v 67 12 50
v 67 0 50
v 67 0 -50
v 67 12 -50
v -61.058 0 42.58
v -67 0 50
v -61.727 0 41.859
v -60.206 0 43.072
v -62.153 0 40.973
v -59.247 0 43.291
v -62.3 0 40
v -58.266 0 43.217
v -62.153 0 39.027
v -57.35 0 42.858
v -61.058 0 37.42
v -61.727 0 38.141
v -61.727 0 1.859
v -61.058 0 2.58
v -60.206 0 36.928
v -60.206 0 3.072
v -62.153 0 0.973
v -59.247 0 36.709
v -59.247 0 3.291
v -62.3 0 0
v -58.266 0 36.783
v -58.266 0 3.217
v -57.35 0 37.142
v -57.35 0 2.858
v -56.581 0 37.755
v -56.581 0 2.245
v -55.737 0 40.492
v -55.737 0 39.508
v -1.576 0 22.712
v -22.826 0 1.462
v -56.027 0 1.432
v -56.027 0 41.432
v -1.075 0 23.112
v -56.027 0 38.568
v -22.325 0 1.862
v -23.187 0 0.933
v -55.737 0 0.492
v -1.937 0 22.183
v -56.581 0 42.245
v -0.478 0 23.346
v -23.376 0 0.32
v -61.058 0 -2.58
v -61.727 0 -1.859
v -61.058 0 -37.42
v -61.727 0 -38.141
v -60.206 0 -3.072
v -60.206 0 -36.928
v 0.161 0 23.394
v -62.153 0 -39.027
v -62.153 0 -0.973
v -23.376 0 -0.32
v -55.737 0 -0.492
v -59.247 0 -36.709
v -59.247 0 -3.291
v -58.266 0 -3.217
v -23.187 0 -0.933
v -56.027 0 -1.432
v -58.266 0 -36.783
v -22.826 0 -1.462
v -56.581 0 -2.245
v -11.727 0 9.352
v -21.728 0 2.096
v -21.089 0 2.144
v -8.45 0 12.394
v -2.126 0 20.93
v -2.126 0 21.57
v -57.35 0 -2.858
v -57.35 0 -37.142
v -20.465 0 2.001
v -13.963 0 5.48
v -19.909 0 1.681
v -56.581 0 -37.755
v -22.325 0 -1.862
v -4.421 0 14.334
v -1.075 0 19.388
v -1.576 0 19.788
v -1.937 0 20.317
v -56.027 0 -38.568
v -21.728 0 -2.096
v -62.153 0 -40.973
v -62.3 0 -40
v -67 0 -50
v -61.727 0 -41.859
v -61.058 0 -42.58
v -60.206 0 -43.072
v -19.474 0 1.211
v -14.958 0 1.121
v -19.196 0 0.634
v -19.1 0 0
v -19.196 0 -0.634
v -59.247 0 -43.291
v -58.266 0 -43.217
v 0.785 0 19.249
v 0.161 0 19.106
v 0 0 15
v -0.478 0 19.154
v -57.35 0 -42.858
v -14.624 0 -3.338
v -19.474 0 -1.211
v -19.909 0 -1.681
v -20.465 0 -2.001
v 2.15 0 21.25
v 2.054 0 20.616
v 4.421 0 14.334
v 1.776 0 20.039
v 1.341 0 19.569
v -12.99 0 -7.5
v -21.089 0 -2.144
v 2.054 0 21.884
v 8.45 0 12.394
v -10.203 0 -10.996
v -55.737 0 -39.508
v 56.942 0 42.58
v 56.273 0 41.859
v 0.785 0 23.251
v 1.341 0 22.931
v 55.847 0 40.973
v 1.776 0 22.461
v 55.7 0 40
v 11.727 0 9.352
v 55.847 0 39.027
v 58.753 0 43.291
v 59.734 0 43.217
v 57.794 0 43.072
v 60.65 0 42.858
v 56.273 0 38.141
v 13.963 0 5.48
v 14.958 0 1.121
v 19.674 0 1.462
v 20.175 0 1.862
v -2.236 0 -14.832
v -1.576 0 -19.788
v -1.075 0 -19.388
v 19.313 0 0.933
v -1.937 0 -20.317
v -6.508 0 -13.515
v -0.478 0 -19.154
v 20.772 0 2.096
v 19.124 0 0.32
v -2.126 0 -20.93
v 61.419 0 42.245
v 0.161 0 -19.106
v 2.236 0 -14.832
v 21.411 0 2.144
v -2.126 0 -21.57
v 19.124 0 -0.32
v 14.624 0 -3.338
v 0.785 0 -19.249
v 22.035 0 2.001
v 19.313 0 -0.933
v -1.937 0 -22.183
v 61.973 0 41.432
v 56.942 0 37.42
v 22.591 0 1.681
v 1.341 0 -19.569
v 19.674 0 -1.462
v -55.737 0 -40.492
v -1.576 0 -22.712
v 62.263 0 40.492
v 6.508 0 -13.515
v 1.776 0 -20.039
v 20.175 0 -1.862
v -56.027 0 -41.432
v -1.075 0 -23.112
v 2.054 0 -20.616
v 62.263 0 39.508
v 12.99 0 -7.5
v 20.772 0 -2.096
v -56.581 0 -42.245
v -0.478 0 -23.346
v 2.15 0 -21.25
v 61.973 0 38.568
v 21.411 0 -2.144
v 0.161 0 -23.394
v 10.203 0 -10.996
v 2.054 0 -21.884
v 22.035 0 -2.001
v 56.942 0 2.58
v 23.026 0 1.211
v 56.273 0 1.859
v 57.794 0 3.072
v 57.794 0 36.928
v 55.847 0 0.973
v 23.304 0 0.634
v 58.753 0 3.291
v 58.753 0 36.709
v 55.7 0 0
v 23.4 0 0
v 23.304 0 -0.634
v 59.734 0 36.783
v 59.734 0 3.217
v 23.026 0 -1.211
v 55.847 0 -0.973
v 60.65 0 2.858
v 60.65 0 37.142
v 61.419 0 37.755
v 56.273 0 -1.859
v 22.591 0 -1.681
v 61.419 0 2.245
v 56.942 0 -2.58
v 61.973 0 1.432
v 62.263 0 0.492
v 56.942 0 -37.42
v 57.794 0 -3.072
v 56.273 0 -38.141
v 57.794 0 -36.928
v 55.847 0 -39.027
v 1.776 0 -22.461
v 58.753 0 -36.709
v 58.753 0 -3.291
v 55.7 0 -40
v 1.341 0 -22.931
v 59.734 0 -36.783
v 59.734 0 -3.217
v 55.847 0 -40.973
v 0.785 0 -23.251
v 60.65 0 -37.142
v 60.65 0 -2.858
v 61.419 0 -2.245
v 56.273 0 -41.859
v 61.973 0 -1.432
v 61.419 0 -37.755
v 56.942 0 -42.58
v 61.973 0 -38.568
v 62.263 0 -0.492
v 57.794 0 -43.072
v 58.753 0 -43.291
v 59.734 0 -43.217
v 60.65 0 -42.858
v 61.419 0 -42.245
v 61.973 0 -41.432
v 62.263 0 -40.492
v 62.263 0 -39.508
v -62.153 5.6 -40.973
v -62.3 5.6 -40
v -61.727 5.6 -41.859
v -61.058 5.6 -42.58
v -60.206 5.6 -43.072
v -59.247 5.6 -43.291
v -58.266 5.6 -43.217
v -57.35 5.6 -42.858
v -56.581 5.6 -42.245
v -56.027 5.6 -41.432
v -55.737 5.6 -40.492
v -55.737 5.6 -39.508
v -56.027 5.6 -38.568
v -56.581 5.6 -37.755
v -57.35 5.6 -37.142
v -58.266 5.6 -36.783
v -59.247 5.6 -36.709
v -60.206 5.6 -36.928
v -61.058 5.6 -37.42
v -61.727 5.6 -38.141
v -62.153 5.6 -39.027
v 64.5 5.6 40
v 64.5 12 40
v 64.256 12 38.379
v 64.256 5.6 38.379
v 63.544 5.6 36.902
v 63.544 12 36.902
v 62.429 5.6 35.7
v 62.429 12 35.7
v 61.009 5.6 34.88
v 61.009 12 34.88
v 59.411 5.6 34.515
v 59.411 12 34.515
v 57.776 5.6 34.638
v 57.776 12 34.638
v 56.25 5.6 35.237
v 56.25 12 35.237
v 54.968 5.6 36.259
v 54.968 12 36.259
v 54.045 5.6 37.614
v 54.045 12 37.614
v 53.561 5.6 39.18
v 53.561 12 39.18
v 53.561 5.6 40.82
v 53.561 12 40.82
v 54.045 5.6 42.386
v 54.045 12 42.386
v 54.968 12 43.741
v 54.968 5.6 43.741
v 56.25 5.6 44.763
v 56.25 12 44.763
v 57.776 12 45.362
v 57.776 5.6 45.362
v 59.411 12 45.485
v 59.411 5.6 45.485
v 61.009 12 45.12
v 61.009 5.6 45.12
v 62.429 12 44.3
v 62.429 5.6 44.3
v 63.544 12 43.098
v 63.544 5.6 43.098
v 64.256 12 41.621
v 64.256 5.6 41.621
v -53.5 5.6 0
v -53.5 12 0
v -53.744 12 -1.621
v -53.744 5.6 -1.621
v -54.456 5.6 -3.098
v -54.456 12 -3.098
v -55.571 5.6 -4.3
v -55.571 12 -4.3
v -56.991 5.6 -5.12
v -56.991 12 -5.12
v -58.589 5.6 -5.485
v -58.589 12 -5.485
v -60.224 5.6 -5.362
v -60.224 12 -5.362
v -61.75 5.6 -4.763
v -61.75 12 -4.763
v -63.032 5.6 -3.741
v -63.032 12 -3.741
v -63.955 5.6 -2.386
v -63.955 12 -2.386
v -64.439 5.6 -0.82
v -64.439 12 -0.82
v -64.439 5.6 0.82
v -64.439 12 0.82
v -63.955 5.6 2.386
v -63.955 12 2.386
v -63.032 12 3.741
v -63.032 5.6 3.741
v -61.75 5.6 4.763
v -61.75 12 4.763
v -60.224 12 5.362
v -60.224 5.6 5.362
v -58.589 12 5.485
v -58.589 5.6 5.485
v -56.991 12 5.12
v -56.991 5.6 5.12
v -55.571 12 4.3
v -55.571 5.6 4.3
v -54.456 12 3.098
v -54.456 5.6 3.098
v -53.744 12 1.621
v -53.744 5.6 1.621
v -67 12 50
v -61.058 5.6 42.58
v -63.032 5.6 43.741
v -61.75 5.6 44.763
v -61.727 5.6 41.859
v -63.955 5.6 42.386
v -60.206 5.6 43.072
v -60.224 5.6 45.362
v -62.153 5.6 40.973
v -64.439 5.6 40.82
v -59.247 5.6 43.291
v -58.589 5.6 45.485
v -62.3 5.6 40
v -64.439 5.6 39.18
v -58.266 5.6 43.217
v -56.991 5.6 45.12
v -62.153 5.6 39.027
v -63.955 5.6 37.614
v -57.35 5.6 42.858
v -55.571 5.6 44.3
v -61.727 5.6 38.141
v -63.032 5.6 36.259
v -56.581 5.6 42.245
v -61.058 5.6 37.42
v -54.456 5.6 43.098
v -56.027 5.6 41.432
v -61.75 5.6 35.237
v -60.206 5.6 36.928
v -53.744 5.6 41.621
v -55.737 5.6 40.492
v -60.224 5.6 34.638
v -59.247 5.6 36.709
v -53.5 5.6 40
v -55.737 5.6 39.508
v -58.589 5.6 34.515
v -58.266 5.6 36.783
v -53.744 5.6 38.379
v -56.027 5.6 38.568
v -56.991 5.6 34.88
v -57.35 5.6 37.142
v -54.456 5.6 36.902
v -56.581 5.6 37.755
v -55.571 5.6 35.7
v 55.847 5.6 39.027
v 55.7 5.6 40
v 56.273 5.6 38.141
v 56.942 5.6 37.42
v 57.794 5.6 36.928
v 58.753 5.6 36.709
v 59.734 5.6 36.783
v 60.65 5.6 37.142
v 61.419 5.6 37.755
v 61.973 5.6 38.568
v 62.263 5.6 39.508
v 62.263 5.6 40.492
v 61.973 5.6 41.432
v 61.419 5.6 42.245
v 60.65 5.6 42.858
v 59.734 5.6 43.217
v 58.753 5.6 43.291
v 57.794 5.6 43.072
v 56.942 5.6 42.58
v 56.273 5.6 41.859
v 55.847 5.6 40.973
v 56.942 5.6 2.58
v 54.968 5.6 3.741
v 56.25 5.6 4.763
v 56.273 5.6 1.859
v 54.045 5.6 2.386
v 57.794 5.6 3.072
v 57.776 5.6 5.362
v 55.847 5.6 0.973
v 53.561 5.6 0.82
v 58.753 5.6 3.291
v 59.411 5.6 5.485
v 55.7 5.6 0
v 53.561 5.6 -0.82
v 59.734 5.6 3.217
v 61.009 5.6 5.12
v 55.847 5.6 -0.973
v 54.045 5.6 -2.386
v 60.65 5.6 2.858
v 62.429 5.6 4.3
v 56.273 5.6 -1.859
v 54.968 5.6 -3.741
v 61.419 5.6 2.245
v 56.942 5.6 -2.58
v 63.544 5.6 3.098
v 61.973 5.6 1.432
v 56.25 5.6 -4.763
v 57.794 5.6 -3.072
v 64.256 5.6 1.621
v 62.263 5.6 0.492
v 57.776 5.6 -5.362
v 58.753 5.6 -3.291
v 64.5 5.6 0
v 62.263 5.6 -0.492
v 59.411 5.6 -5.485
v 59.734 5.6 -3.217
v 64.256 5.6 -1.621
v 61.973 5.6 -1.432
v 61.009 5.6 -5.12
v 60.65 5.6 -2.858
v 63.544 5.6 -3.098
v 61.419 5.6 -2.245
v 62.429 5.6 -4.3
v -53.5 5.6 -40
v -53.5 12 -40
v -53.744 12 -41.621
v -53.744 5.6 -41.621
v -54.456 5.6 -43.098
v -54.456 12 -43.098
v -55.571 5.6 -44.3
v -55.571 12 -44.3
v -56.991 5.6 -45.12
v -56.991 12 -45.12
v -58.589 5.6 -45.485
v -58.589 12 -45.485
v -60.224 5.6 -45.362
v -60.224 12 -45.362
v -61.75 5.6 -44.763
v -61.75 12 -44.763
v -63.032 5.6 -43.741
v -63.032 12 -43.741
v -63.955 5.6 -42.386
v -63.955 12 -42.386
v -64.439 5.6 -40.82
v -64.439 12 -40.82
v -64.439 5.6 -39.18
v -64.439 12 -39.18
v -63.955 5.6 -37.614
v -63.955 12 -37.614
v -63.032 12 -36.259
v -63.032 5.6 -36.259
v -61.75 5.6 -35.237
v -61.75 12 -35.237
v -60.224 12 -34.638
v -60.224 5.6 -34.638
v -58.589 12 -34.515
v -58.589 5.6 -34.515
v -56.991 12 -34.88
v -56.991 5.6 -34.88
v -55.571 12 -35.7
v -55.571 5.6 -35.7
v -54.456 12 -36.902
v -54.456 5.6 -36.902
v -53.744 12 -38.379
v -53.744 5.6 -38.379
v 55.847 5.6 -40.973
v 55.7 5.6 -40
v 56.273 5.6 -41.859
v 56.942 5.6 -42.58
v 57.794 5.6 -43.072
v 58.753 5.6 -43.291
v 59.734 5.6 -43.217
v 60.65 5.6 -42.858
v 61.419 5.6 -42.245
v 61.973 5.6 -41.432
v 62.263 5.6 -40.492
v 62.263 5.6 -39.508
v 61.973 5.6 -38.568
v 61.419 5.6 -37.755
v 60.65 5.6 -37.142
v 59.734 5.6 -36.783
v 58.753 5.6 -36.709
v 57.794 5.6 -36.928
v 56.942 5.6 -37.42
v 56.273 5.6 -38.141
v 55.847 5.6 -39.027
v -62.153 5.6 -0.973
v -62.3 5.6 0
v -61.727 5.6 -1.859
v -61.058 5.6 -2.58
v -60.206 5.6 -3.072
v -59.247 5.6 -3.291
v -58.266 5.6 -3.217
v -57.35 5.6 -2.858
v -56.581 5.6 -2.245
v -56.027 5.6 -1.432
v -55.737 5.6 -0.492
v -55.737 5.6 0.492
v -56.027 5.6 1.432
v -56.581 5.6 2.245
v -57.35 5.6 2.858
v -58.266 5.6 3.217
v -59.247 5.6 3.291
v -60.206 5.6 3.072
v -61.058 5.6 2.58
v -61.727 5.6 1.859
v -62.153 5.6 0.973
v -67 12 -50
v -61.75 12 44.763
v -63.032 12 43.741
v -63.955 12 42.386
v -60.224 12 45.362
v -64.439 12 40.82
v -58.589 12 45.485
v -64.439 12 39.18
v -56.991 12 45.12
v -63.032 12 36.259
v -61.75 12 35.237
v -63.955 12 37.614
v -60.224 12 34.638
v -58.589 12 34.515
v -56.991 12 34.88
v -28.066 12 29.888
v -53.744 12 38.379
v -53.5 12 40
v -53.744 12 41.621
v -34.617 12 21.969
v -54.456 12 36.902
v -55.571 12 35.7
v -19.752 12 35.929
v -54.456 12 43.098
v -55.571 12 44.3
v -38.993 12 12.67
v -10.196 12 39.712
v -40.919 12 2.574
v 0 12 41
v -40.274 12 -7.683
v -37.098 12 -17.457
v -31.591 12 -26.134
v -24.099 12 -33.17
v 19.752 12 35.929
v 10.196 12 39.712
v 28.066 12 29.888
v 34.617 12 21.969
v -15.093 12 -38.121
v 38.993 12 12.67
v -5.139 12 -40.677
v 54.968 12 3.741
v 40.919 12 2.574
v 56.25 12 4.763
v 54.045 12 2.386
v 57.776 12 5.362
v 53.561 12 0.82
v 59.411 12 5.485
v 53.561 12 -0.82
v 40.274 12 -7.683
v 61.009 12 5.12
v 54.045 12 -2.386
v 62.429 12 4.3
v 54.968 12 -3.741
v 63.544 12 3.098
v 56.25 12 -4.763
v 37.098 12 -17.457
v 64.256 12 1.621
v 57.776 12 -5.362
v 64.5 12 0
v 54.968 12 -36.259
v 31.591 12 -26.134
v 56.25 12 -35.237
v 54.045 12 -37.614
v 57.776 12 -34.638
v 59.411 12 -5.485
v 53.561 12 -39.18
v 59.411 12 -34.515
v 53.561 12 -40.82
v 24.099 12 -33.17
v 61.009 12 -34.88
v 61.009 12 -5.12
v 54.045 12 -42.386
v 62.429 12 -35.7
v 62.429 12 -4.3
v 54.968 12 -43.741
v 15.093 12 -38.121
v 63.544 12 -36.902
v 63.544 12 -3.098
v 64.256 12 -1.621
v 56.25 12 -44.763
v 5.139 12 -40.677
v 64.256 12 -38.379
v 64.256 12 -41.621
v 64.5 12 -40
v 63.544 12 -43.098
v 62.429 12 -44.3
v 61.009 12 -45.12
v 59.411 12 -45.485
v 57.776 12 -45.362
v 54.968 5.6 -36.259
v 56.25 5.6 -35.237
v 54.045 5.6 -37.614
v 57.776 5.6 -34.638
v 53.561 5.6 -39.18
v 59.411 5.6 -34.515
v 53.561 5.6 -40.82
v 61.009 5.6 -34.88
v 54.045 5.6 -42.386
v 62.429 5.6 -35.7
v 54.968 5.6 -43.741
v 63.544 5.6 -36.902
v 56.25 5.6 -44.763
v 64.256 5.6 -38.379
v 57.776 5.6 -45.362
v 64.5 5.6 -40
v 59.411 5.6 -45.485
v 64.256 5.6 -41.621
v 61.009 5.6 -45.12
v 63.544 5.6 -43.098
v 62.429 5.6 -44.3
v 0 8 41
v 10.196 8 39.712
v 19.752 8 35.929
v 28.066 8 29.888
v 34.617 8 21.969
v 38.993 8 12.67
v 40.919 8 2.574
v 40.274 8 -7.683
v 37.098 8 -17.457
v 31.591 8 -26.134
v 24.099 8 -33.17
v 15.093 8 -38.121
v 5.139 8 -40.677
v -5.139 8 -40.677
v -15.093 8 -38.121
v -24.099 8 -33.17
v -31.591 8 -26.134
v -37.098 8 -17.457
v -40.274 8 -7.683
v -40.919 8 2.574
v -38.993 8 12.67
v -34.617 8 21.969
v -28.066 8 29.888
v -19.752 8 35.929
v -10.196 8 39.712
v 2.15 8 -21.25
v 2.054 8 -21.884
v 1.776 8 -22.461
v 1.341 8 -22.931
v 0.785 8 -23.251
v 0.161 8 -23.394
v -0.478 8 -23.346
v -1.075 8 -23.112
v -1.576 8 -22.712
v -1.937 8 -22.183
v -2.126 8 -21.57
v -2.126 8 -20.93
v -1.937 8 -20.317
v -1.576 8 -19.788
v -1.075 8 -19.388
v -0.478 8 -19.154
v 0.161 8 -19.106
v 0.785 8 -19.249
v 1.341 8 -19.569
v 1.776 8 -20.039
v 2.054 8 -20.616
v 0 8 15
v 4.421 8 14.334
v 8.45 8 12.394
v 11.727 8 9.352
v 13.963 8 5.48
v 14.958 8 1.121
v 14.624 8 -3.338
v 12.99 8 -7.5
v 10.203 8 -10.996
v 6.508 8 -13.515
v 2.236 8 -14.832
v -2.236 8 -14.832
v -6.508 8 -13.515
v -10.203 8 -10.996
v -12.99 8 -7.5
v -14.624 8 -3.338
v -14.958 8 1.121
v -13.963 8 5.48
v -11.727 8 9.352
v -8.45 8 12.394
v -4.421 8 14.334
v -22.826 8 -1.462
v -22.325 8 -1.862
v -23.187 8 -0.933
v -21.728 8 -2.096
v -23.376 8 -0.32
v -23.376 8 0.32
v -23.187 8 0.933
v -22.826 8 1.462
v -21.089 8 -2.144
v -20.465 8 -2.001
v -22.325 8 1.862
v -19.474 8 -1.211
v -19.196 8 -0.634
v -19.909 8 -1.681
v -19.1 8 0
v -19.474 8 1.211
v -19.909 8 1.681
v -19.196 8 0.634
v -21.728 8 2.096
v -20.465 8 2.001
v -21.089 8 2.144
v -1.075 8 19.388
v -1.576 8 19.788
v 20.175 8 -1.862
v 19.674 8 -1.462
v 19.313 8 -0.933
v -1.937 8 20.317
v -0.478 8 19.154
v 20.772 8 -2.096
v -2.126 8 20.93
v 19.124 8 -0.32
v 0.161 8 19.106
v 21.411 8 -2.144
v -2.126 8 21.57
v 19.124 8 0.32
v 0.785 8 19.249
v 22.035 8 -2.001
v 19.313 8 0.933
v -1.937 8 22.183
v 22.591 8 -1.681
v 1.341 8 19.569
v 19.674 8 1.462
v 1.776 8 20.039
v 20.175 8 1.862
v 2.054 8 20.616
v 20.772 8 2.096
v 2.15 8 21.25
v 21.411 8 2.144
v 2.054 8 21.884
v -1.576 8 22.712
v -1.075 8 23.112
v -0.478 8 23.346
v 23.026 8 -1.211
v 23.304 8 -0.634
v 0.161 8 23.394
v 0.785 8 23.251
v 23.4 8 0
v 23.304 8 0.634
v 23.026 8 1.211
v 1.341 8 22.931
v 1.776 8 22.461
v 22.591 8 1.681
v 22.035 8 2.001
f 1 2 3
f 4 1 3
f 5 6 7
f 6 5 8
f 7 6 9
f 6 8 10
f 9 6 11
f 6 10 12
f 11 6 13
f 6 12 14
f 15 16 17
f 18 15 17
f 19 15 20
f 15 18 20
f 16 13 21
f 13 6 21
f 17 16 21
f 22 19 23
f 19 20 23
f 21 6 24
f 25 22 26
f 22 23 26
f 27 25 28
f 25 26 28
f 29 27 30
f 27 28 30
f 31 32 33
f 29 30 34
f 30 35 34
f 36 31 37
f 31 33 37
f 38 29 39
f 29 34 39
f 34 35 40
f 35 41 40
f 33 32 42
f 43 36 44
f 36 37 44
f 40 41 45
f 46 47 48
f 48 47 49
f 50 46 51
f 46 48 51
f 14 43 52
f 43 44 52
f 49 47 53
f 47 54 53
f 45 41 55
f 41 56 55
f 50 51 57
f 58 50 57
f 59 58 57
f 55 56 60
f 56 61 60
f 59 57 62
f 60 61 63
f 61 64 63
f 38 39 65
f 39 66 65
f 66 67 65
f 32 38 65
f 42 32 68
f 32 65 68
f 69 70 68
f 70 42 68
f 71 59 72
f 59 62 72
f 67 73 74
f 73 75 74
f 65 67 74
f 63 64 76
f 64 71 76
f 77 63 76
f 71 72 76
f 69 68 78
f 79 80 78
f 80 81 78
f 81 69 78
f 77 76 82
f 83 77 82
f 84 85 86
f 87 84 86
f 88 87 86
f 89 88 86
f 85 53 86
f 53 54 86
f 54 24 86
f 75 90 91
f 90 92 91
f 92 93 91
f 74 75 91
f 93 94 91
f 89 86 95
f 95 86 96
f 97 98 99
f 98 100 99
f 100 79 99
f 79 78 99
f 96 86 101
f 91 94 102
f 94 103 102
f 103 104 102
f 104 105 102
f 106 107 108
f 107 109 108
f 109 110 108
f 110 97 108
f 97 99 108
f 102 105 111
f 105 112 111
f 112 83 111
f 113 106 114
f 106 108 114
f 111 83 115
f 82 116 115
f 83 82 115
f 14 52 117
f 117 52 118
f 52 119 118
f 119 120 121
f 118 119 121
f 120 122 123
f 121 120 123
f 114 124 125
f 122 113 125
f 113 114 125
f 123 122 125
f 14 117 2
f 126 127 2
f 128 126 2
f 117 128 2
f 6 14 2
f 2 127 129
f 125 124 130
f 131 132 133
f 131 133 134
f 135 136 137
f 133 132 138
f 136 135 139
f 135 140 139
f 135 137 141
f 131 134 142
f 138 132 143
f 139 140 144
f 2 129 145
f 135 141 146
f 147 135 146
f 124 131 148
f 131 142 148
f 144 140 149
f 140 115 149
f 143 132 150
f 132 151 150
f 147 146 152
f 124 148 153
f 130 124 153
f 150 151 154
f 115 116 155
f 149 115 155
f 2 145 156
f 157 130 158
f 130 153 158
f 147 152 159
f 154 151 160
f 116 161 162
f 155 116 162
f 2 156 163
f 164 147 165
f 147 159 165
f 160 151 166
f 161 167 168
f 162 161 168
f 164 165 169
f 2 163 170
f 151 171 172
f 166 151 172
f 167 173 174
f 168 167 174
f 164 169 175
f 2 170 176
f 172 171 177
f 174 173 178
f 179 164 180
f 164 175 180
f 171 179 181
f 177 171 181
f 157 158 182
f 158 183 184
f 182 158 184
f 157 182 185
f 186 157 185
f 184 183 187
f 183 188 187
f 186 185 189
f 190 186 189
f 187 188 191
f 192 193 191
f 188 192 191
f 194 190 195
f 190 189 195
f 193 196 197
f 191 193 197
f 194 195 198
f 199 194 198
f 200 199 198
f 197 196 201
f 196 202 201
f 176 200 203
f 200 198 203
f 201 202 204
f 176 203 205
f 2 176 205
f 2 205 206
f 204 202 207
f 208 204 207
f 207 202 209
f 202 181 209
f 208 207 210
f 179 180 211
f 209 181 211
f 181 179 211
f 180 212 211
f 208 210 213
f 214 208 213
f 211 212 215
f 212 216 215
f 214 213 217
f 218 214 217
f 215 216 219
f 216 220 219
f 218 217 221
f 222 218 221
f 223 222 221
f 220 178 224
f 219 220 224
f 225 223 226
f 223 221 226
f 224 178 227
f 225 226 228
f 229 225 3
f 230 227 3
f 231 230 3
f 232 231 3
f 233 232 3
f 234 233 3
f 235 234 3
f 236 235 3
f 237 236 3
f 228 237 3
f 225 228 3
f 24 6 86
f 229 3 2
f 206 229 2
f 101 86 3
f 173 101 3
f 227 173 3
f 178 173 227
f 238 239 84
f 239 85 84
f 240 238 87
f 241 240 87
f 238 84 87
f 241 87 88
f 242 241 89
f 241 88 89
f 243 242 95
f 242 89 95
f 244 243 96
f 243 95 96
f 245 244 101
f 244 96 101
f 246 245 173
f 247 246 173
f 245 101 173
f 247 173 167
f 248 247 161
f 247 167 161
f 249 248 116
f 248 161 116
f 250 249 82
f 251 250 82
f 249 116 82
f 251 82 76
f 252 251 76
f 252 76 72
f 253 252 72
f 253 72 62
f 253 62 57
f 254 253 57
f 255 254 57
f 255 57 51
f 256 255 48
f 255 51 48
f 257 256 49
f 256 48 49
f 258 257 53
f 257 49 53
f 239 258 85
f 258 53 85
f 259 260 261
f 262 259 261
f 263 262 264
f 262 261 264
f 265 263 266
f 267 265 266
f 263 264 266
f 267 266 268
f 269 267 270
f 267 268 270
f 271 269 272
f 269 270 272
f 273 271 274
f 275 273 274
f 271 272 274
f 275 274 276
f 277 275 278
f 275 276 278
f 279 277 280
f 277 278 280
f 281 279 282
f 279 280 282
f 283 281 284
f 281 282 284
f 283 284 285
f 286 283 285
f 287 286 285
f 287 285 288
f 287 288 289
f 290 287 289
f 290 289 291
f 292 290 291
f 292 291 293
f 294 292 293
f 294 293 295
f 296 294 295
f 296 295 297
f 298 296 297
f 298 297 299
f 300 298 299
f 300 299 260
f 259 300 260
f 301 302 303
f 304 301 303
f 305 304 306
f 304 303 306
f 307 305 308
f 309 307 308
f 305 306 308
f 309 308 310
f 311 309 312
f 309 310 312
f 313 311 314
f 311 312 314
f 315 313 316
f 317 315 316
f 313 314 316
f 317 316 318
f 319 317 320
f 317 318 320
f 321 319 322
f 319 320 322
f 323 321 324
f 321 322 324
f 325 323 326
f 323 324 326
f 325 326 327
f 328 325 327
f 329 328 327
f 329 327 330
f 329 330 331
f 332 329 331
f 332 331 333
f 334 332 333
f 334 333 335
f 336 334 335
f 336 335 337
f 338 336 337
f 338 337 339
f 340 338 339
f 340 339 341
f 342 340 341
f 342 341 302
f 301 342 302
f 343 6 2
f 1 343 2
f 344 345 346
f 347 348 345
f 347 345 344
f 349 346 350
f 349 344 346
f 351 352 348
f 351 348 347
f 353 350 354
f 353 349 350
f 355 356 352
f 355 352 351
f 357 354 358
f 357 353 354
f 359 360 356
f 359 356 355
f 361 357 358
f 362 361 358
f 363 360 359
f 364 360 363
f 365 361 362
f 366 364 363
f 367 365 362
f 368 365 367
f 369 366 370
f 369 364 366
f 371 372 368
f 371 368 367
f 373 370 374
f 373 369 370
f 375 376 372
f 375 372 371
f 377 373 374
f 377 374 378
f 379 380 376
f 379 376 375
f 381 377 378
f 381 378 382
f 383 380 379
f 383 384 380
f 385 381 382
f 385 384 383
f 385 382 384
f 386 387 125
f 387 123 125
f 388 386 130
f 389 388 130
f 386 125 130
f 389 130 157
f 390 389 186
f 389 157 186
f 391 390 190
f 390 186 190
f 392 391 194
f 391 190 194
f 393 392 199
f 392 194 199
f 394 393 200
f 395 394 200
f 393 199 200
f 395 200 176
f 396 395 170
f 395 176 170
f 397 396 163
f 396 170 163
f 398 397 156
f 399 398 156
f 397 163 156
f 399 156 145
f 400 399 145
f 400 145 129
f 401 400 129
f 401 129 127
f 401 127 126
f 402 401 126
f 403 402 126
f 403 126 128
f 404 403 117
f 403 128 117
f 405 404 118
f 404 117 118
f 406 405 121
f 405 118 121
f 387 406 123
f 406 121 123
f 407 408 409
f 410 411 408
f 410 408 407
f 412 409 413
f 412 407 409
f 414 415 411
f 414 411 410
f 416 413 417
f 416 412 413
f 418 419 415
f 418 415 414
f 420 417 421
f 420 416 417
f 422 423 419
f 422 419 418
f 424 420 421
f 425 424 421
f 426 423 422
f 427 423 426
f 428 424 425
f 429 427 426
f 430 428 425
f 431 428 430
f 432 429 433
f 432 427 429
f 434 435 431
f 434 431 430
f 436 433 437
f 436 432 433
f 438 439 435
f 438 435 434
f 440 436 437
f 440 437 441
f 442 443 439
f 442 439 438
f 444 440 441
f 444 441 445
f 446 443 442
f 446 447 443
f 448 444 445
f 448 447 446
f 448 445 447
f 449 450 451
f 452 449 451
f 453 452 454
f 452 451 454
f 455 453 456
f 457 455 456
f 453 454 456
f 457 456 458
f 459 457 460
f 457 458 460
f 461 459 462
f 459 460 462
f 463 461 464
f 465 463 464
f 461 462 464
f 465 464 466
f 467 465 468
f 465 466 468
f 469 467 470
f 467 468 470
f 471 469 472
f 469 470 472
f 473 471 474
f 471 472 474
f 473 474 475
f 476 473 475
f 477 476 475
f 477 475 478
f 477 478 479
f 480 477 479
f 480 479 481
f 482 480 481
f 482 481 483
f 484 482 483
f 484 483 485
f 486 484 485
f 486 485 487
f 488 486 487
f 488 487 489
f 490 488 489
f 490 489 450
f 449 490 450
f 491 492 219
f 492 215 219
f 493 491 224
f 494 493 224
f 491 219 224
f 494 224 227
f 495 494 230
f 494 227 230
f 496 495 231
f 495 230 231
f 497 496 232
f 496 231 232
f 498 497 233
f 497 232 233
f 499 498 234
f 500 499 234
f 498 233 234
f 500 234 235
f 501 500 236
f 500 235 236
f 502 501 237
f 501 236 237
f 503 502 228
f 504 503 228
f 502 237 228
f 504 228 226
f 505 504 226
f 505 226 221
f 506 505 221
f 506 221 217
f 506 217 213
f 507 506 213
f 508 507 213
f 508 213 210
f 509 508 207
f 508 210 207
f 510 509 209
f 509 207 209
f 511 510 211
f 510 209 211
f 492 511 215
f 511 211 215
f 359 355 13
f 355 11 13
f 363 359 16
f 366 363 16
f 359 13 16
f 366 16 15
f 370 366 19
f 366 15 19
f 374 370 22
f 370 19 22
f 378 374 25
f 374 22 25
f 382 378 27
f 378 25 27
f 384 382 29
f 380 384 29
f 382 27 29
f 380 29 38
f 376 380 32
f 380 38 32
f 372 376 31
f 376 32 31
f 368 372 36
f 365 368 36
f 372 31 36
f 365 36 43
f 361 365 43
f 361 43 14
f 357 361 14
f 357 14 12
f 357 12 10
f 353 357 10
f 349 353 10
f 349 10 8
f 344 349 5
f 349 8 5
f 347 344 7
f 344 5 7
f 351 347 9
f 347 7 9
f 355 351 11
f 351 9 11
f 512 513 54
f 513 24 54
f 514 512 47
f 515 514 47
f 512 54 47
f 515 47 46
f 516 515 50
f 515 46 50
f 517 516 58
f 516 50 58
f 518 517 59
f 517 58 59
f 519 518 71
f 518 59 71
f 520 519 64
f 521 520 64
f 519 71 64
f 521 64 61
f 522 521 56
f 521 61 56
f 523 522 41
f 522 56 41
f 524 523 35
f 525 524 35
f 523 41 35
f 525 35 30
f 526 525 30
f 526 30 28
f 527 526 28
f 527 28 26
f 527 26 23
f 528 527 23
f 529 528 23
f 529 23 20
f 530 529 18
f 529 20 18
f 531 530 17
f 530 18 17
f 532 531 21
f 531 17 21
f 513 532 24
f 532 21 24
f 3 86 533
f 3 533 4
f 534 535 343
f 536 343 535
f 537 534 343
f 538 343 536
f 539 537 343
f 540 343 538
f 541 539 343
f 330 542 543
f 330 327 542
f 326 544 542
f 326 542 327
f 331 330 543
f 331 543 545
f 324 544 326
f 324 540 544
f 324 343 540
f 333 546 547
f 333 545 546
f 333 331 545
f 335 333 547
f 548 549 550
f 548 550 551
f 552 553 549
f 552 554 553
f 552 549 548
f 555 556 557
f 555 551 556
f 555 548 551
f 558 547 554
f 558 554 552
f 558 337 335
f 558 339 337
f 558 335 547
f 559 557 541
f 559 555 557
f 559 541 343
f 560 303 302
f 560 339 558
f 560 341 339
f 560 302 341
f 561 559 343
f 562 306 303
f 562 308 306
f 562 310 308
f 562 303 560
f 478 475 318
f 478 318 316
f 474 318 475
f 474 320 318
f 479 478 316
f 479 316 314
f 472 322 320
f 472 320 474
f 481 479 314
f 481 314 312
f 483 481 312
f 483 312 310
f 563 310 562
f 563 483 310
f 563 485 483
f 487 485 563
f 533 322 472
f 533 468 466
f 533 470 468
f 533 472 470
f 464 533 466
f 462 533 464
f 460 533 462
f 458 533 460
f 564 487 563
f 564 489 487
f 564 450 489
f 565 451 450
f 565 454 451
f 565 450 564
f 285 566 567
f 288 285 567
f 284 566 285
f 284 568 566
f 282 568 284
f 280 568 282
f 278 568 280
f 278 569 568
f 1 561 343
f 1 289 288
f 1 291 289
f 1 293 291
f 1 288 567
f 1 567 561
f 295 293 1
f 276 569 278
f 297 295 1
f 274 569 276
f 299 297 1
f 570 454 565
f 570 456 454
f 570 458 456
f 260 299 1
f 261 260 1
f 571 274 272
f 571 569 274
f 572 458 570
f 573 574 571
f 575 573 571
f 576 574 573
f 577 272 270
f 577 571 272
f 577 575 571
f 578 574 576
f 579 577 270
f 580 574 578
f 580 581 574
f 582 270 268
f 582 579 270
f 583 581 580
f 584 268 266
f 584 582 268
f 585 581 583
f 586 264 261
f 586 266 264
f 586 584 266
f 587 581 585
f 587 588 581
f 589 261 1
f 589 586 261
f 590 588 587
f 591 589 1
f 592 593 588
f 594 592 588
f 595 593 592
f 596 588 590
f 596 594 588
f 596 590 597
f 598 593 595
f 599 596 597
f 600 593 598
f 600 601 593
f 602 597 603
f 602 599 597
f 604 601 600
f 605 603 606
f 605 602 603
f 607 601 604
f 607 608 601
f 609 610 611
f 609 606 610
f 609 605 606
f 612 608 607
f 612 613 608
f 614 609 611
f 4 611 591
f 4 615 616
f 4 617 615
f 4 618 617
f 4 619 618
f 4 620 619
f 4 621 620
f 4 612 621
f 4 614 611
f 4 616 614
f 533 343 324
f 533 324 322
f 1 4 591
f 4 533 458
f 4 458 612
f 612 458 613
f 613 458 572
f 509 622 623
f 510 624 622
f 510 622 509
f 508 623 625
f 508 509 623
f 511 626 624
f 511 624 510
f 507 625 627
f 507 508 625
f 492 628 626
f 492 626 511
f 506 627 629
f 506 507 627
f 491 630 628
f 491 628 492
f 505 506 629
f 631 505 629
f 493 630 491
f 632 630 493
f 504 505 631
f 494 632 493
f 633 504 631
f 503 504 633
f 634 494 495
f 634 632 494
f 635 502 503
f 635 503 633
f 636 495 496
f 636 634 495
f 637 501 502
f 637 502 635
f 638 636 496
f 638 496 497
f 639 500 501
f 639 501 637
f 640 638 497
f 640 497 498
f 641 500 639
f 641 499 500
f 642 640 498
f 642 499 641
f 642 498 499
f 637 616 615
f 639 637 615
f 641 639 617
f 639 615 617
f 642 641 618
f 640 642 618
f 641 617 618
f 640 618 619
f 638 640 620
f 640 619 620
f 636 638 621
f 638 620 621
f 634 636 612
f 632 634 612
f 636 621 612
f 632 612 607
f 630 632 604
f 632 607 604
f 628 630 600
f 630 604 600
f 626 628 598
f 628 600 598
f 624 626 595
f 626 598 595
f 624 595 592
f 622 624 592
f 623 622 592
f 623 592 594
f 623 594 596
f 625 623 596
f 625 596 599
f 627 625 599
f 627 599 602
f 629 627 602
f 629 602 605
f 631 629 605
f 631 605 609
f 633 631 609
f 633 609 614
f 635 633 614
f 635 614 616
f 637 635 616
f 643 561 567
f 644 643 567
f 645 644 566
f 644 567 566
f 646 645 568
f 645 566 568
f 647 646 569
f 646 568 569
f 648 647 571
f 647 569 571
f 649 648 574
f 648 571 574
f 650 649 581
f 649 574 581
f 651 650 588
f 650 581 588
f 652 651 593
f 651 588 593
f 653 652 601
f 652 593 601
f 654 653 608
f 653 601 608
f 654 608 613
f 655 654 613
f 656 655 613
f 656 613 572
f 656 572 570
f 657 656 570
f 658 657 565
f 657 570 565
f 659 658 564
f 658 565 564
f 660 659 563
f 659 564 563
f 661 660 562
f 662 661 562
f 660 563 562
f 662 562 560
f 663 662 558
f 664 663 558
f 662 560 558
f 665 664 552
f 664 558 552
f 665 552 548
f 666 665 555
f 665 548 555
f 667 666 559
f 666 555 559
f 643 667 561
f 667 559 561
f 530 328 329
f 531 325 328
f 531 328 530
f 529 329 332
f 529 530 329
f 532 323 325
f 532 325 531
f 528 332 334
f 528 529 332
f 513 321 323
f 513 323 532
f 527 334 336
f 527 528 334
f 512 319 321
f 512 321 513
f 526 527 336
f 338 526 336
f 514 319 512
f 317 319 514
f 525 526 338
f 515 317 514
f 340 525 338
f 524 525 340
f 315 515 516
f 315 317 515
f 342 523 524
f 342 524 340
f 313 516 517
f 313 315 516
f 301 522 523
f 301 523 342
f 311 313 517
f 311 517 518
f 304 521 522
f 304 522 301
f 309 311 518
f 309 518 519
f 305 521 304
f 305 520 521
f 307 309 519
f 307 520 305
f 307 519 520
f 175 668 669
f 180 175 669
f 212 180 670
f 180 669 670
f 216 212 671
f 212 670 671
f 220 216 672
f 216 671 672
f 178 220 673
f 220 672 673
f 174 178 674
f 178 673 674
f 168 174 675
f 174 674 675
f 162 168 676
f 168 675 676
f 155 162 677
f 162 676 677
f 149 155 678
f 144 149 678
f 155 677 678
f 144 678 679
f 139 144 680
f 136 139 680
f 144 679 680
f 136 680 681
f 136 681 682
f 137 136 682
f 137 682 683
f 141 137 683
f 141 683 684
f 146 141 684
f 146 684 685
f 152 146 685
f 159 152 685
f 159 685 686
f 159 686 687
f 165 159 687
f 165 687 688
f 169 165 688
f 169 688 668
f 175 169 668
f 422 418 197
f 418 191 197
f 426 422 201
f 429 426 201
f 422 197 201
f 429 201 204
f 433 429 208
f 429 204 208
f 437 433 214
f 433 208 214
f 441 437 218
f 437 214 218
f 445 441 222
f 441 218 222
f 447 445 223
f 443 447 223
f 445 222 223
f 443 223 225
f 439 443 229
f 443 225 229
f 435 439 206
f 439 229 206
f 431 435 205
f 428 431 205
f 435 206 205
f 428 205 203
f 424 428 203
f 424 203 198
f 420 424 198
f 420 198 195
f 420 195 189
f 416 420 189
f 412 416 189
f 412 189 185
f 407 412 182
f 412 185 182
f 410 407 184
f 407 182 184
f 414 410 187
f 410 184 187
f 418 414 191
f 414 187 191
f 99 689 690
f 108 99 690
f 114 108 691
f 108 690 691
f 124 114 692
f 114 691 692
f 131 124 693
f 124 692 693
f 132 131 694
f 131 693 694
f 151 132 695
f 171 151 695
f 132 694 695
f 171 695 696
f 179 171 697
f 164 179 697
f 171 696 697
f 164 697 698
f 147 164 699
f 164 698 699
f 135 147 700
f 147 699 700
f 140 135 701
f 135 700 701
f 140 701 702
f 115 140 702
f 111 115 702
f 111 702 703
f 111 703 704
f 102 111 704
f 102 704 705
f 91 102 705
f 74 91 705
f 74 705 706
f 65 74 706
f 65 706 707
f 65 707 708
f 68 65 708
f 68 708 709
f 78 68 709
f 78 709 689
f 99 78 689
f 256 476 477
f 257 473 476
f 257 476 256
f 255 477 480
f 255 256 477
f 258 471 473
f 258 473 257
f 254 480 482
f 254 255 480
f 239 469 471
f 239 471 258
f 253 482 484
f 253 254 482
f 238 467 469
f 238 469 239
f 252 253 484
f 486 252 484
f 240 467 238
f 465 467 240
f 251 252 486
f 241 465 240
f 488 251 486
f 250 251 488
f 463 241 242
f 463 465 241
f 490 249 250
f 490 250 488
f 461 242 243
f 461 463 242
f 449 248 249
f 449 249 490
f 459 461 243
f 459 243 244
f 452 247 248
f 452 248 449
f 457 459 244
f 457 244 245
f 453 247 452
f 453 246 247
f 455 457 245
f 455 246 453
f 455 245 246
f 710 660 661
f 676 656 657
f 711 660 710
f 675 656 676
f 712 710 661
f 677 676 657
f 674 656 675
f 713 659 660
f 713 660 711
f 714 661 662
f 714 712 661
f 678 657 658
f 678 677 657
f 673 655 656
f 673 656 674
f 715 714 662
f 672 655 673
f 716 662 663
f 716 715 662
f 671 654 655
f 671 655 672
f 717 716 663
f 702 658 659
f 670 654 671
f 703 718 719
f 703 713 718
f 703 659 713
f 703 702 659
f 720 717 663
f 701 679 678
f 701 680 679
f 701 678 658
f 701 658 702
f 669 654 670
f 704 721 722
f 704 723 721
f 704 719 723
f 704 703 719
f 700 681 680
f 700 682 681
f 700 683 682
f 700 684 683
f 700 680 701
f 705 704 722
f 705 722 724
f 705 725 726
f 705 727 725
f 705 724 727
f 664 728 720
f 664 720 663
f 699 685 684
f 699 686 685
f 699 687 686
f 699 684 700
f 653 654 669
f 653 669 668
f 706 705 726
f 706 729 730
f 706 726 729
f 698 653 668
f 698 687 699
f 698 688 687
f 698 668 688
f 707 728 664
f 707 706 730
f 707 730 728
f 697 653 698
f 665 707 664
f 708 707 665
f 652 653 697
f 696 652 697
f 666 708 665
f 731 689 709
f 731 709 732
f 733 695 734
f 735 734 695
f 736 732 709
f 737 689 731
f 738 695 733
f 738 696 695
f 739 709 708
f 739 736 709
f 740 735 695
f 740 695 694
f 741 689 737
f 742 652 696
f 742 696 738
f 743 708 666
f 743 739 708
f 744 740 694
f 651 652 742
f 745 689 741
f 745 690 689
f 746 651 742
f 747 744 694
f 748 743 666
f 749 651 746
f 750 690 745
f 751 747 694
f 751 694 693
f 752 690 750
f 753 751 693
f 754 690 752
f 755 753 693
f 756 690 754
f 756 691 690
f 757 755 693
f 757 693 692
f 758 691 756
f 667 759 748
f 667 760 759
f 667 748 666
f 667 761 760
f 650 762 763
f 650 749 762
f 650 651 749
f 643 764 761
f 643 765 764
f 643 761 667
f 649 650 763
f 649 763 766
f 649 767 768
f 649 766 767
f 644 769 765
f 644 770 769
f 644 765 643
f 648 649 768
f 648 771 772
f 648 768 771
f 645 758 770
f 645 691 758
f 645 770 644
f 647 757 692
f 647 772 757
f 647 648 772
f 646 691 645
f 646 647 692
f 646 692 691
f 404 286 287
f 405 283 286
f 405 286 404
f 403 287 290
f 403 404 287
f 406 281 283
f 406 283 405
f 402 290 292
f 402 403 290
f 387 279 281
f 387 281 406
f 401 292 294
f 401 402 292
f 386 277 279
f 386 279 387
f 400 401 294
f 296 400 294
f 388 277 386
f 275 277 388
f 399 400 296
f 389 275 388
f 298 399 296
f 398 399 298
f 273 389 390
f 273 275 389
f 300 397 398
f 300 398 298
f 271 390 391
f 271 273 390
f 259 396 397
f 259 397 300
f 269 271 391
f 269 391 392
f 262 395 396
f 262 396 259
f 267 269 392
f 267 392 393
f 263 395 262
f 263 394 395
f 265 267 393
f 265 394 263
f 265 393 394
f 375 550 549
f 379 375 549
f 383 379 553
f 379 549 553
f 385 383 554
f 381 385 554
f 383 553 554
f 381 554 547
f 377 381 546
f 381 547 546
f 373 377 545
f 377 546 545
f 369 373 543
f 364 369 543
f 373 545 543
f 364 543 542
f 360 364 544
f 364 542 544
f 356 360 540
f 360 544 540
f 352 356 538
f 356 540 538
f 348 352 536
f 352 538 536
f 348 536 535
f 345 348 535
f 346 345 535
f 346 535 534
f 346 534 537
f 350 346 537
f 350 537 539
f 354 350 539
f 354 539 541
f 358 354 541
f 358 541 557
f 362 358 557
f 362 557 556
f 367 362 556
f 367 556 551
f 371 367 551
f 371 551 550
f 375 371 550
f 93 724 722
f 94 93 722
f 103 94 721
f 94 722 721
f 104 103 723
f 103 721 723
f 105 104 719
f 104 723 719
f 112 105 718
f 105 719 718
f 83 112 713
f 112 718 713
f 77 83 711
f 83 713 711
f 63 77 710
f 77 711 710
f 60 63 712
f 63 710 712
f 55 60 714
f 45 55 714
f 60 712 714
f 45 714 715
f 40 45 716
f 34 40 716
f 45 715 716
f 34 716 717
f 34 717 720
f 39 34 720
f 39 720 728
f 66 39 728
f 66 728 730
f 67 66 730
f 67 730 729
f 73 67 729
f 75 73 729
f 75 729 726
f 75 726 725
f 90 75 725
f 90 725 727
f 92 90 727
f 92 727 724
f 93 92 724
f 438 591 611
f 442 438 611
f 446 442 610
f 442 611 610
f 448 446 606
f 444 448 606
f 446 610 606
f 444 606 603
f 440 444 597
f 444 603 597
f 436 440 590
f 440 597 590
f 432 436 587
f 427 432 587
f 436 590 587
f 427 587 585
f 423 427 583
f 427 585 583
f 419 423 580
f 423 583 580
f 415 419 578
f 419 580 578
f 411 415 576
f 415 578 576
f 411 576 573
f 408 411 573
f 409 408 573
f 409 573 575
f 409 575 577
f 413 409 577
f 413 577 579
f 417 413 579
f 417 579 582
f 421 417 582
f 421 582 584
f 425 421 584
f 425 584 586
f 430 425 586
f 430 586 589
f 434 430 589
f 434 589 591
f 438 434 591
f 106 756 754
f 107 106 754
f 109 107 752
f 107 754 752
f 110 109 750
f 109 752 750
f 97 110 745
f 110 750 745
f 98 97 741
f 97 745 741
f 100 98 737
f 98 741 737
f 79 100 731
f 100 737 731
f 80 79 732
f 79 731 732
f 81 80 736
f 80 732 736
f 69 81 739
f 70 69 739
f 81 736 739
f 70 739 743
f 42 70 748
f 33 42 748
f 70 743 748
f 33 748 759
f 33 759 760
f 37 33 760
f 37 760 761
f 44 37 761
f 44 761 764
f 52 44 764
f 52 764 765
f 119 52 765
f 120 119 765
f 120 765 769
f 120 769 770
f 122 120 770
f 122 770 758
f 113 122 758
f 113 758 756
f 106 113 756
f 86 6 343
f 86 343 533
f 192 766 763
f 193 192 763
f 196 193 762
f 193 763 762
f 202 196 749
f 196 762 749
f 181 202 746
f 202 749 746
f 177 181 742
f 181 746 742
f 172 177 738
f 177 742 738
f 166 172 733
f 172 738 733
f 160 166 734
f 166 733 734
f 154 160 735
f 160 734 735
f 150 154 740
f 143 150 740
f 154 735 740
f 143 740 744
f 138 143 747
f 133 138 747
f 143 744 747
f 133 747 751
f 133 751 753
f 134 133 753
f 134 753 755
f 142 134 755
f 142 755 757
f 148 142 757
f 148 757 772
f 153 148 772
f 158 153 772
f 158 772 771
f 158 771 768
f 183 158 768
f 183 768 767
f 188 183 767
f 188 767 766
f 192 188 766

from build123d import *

# Parameters (mm, degrees)
SKETCH1_W                                           = 134
SKETCH1_H                                           = 100
BOSS_EXTRUDE1_DEPTH                                 = 12
SKETCH2_R                                           = 41
CUT_EXTRUDE1_DEPTH                                  = 4
SKETCH3_R                                           = 15
CUT_EXTRUDE2_DEPTH                                  = 84.982140959
M4_CLEARANCE_HOLE1_D                                = 4.3
M4_CLEARANCE_HOLE1_DEPTH                            = 15
M4_CLEARANCE_HOLE1_TIP                              = 1.291850331
CBORE_FOR_M6_HEX_SOCKET_HEAD_CAP_SCREW1_D           = 6.6
CBORE_FOR_M6_HEX_SOCKET_HEAD_CAP_SCREW1_DEPTH       = 15
CBORE_FOR_M6_HEX_SOCKET_HEAD_CAP_SCREW1_CBORE_D     = 11
CBORE_FOR_M6_HEX_SOCKET_HEAD_CAP_SCREW1_CBORE_DEPTH = 6.4
CBORE_FOR_M6_HEX_SOCKET_HEAD_CAP_SCREW1_TIP         = 1.982840043


with BuildPart() as part:
    # Sketch1 → Boss-Extrude1 (new body)
    with BuildSketch(Plane(origin=(0, 0, 0), x_dir=(1, 0, 0), z_dir=(0, 1, 0))):
        Rectangle(SKETCH1_W, SKETCH1_H)
    extrude(amount=BOSS_EXTRUDE1_DEPTH)

    # Sketch2 → Cut-Extrude1 (cut)
    with BuildSketch(Plane(origin=(0, 12, 0), x_dir=(1, 0, 0), z_dir=(0, 1, 0))):
        with Locations(Location((0, 0, 0), (0, 0, 270))):
            Circle(SKETCH2_R)
    extrude(amount=-CUT_EXTRUDE1_DEPTH, mode=Mode.SUBTRACT)

    # Sketch3 → Cut-Extrude2 (cut, through all)
    with BuildSketch(Plane(origin=(0, 8, 0), x_dir=(1, 0, 0), z_dir=(0, 1, 0))):
        with Locations(Location((0, 0, 0), (0, 0, 270))):
            Circle(SKETCH3_R)
    extrude(amount=-CUT_EXTRUDE2_DEPTH, mode=Mode.SUBTRACT)

    # M4 Clearance Hole1
    with Locations(Plane(origin=(0, 0, 0), x_dir=(-1, 0, 0), z_dir=(0, -1, 0))):
        with Locations((-21.25, 0), (0, 21.25), (21.25, 0), (0, -21.25)):
            Hole(M4_CLEARANCE_HOLE1_D / 2, depth=M4_CLEARANCE_HOLE1_DEPTH)
            with Locations((0, 0, -(M4_CLEARANCE_HOLE1_DEPTH + M4_CLEARANCE_HOLE1_TIP / 2))):  # 118° drill point
                Cone(0, M4_CLEARANCE_HOLE1_D / 2, M4_CLEARANCE_HOLE1_TIP, mode=Mode.SUBTRACT)

    # CBORE for M6 Hex Socket Head Cap Screw1
    with Locations(Plane(origin=(0, 12, 0), x_dir=(1, 0, 0), z_dir=(0, 1, 0))):
        with Locations((59, 40), (-59, 40), (-59, 0), (-59, -40), (59, 0), (59, -40)):
            CounterBoreHole(CBORE_FOR_M6_HEX_SOCKET_HEAD_CAP_SCREW1_D / 2, CBORE_FOR_M6_HEX_SOCKET_HEAD_CAP_SCREW1_CBORE_D / 2, CBORE_FOR_M6_HEX_SOCKET_HEAD_CAP_SCREW1_CBORE_DEPTH, depth=CBORE_FOR_M6_HEX_SOCKET_HEAD_CAP_SCREW1_DEPTH)
            with Locations((0, 0, -(CBORE_FOR_M6_HEX_SOCKET_HEAD_CAP_SCREW1_DEPTH + CBORE_FOR_M6_HEX_SOCKET_HEAD_CAP_SCREW1_TIP / 2))):  # 118° drill point
                Cone(0, CBORE_FOR_M6_HEX_SOCKET_HEAD_CAP_SCREW1_D / 2, CBORE_FOR_M6_HEX_SOCKET_HEAD_CAP_SCREW1_TIP, mode=Mode.SUBTRACT)


solid = part.part
